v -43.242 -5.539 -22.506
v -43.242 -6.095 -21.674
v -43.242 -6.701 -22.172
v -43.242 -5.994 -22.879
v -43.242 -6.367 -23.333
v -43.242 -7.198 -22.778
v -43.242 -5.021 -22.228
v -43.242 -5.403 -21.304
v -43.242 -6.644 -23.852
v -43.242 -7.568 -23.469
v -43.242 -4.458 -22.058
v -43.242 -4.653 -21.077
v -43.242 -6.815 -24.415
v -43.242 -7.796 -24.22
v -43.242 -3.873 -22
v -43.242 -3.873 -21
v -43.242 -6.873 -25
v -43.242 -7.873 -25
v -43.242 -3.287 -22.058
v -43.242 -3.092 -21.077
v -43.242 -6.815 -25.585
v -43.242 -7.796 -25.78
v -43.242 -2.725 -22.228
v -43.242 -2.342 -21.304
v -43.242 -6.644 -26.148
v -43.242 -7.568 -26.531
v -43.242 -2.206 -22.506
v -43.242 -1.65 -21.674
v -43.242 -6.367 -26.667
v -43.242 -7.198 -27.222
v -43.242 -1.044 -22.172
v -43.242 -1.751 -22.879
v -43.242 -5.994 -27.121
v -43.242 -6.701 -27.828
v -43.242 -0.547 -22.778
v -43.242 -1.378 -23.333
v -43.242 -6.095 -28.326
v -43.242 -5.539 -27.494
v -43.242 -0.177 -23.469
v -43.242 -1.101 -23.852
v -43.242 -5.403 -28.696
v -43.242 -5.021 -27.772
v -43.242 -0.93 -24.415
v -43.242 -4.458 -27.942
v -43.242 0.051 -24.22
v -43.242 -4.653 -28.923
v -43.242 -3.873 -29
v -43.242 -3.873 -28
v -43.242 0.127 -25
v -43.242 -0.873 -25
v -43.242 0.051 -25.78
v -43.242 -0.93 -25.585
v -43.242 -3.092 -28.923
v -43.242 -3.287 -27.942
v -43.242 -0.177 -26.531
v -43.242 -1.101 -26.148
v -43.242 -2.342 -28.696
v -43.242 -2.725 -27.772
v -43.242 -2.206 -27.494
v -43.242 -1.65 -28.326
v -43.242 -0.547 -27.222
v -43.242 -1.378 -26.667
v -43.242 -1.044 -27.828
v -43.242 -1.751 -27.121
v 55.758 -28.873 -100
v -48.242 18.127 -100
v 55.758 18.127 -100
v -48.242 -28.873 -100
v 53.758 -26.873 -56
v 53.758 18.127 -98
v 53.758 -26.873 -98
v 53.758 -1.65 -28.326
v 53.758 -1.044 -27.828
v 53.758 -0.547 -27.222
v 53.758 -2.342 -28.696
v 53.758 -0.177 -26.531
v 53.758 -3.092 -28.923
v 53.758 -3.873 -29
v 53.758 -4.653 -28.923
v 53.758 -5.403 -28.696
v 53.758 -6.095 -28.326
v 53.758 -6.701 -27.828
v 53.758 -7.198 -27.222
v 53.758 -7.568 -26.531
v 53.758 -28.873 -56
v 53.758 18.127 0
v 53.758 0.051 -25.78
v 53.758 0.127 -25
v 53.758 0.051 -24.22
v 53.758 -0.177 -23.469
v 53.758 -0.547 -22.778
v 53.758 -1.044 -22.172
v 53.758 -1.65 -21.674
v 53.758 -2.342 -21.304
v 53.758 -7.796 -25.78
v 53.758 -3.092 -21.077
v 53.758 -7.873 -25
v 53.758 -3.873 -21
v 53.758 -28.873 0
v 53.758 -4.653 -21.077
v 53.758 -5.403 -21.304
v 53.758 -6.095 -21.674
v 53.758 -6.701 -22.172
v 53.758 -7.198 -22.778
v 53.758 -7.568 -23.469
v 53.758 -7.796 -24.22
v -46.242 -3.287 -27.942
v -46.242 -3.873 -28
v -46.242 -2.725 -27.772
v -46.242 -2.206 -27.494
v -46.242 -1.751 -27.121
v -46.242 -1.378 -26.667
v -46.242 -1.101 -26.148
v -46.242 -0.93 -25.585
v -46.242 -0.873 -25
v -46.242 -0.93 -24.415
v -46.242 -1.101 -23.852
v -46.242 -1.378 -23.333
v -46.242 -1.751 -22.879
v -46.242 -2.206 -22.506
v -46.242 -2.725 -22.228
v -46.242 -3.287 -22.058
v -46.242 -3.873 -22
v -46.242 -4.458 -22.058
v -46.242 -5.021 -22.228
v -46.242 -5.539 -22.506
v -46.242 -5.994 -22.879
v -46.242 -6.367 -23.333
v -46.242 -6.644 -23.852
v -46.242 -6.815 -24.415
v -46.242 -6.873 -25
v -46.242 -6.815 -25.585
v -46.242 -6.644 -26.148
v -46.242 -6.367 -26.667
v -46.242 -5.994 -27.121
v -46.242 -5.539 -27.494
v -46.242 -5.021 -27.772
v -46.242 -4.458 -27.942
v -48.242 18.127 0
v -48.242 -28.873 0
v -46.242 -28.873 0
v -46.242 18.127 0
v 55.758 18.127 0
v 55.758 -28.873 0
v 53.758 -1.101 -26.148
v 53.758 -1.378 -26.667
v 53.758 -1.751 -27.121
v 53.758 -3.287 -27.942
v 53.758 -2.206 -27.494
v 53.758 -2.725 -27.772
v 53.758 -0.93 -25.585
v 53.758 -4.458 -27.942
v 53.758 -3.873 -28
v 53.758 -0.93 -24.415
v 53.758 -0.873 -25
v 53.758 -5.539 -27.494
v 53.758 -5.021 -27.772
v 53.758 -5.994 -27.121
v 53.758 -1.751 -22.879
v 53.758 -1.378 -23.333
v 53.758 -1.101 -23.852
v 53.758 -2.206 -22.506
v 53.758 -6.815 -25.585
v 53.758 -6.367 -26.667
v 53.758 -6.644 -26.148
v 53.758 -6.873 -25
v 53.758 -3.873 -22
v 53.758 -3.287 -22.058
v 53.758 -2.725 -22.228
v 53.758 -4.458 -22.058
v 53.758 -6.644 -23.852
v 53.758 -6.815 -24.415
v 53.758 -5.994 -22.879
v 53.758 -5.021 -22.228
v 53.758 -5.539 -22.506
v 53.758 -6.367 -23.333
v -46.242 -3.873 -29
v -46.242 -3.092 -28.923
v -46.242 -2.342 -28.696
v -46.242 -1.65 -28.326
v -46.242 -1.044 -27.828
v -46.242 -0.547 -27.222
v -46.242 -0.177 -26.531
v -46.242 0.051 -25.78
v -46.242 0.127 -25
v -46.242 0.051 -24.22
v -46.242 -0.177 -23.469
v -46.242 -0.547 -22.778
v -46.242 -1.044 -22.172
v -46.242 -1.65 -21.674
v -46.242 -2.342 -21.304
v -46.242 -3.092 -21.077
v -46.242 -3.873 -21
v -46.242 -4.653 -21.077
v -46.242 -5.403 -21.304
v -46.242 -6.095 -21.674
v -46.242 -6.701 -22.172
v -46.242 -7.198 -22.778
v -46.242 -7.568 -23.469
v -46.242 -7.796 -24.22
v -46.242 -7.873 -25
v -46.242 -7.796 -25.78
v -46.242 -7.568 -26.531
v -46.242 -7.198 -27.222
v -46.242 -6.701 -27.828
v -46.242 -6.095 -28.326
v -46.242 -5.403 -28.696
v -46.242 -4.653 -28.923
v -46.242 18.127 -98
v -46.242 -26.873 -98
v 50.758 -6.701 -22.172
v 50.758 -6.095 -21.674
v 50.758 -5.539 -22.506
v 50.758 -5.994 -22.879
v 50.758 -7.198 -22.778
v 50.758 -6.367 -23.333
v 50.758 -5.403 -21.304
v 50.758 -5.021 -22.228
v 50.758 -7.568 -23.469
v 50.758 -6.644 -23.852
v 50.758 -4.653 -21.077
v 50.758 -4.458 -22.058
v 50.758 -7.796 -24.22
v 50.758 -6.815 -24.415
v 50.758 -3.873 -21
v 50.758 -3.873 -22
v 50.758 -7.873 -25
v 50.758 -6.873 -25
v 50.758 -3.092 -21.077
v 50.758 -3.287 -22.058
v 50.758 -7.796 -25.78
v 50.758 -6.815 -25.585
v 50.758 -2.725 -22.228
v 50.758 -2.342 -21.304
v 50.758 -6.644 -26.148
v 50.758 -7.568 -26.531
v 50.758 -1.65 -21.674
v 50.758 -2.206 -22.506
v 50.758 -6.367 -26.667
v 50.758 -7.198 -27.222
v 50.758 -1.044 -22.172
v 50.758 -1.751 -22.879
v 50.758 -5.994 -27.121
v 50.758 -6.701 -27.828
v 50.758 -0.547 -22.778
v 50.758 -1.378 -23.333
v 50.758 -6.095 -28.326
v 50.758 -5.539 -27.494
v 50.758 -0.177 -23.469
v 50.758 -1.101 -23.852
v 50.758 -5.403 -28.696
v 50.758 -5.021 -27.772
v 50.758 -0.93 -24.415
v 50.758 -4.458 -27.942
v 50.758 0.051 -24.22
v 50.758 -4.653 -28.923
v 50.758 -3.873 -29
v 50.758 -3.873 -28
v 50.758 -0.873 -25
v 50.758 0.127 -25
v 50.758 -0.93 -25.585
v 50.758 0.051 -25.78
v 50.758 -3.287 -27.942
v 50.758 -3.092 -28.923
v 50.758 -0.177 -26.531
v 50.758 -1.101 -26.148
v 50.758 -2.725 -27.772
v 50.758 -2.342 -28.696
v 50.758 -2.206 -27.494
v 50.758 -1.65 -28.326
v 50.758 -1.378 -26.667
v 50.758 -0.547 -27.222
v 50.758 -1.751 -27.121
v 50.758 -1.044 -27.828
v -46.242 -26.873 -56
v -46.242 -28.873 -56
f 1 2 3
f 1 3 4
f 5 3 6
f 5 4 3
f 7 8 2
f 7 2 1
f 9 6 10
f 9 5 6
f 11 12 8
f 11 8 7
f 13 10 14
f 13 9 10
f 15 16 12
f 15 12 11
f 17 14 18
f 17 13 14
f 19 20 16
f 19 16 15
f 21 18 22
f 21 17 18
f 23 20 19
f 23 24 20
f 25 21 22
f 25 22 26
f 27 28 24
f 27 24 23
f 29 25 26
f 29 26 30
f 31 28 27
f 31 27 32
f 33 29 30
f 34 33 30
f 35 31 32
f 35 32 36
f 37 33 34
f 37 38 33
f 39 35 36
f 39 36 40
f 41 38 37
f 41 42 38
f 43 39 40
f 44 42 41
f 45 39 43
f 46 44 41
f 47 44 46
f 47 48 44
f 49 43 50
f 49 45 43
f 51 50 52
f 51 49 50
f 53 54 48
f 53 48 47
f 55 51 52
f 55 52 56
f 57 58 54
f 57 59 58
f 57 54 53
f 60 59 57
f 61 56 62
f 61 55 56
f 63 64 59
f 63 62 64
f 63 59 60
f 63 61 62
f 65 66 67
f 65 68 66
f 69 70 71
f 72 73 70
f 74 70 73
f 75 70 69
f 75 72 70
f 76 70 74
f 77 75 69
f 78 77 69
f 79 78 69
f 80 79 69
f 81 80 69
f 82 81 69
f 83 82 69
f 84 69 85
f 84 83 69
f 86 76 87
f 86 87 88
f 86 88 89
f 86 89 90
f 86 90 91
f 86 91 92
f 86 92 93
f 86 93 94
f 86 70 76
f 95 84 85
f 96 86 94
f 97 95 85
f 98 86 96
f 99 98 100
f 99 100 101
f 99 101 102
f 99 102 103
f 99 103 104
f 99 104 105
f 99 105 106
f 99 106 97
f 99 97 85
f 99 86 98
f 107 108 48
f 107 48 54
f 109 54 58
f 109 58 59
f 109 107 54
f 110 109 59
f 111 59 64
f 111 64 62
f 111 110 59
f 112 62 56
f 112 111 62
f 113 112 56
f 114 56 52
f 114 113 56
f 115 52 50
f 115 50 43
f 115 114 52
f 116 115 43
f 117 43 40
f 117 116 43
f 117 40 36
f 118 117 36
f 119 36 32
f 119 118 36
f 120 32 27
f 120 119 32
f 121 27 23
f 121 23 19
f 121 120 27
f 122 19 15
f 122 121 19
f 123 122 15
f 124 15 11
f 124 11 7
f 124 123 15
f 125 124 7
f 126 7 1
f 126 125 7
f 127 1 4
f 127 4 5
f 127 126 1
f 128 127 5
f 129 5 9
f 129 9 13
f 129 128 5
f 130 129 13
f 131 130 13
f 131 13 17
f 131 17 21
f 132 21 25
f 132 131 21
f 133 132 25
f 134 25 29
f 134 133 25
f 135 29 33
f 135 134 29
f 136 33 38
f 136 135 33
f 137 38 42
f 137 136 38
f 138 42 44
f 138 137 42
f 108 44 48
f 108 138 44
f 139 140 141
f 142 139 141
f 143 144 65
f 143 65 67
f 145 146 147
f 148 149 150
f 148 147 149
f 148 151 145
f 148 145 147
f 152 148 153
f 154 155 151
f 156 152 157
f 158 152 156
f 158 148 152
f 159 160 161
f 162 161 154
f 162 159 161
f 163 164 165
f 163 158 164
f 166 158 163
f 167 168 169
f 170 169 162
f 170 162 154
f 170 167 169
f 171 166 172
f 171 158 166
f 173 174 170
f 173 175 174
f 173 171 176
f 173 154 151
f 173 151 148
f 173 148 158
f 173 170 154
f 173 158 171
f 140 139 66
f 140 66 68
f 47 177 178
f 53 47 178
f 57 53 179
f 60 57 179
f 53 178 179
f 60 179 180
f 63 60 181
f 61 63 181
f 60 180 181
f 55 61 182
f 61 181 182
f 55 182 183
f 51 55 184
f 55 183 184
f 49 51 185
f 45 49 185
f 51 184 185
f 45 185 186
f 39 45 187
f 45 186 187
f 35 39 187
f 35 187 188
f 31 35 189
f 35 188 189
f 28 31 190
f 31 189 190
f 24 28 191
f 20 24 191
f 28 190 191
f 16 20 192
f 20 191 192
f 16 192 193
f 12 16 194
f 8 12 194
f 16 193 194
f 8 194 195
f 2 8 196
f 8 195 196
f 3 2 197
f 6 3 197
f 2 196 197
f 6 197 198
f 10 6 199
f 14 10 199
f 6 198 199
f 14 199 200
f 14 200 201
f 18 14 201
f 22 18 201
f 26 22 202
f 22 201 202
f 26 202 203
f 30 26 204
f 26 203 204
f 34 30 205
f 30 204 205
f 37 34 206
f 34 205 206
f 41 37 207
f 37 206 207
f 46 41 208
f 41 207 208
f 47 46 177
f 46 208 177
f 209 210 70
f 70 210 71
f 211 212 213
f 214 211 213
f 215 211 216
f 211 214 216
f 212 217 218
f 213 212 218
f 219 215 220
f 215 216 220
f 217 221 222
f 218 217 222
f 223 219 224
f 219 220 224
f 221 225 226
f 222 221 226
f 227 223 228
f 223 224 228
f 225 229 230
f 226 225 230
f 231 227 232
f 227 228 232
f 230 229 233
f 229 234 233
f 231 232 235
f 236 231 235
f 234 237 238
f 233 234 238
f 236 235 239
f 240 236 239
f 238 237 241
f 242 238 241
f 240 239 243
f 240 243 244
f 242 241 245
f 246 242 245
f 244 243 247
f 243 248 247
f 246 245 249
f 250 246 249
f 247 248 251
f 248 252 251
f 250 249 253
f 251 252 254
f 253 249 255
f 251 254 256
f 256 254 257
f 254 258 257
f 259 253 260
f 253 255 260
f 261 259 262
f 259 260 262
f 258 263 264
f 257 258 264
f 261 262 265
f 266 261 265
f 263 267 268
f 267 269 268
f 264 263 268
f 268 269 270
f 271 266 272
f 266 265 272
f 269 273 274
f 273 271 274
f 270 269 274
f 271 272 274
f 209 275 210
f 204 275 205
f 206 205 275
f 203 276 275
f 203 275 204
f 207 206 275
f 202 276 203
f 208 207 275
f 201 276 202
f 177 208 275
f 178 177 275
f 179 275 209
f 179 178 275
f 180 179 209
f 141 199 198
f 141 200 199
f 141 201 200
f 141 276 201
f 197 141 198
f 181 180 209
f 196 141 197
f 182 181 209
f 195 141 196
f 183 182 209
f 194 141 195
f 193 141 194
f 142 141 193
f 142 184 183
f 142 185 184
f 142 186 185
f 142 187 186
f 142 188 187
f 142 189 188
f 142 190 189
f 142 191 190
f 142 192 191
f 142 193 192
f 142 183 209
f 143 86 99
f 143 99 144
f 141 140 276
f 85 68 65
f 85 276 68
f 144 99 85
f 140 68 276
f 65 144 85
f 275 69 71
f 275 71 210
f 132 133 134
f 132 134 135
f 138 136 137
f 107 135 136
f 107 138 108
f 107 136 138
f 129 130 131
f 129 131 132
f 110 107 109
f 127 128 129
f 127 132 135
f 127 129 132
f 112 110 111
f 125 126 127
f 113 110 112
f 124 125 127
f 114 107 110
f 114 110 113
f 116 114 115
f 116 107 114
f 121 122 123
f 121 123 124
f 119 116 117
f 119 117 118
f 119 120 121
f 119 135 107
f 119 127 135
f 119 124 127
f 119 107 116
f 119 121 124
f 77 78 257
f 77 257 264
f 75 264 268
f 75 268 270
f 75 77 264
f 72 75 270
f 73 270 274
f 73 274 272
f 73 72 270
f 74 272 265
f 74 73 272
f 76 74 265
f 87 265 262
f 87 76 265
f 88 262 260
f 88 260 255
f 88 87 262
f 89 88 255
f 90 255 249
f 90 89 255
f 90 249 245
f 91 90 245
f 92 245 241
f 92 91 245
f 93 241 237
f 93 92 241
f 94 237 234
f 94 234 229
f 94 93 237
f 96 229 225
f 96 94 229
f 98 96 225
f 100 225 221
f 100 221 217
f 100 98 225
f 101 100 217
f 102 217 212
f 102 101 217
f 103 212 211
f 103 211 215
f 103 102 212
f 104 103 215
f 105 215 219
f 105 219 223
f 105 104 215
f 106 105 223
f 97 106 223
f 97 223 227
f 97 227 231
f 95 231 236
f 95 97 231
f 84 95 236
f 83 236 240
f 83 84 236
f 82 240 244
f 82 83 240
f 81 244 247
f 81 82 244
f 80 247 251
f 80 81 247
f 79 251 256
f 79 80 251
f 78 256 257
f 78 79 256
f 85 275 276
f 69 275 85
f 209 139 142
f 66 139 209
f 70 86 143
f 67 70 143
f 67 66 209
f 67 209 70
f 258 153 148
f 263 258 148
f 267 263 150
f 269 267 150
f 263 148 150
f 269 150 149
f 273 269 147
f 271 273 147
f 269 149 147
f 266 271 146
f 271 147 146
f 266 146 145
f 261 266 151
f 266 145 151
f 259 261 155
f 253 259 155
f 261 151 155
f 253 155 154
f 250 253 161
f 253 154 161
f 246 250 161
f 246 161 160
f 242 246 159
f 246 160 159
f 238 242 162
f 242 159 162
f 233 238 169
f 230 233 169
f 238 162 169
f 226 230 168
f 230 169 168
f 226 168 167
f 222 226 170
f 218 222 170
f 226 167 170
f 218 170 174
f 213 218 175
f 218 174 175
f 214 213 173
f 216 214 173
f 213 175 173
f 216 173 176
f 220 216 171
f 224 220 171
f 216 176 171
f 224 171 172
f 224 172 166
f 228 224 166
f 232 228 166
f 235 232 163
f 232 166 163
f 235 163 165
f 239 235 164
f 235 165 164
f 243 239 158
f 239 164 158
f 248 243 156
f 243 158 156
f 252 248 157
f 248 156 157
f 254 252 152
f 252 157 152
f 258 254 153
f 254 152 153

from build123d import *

# Parameters (mm, degrees)
EXTRUDE_1_DEPTH     = 100
SKETCH_5_W          = 100
SKETCH_5_H          = 2
EXTRUDE_1_2_DEPTH   = 45
SKETCH_6_W          = 100
SKETCH_6_H          = 56
CUT_EXTRUDE_1_DEPTH = 124.020020532
SKETCH_7_R          = 4
SKETCH_7_R_2        = 3
EXTRUDE_2_DEPTH     = 3


with BuildPart() as part:
    # 草图1 → Extrude 1 (new body)
    with BuildSketch(Plane.XY):
        Polygon((-48.242261061, 18.127395065), (-48.242261061, -28.872604935), (55.757738939, -28.872604935), (55.757738939, 18.127395065), (53.757738939, 18.127395065), (53.757738939, -26.872604935), (-46.242261061, -26.872604935), (-46.242261061, 18.127395065), align=None)
    extrude(amount=-EXTRUDE_1_DEPTH)

    # 草图5 → Extrude 1 2 (add)
    with BuildSketch(Plane(origin=(0, -26.872604935, 0), x_dir=(1, 0, 0), z_dir=(0, 1, 0))):
        with Locations((3.757738939, 99)):
            Rectangle(SKETCH_5_W, SKETCH_5_H)
    extrude(amount=EXTRUDE_1_2_DEPTH)

    # 草图6 → 切除-拉伸1 (cut, through all)
    with BuildSketch(Plane(origin=(0, -26.872604935, 0), x_dir=(1, 0, 0), z_dir=(0, 1, 0))):
        with Locations((3.757738939, 28)):
            Rectangle(SKETCH_6_W, SKETCH_6_H)
    extrude(amount=-CUT_EXTRUDE_1_DEPTH, mode=Mode.SUBTRACT)

    # 草图7 → 拉伸-薄壁2 (add)
    with BuildSketch(Plane(origin=(-46.242261061, 0, 0), x_dir=(0, 0, -1), z_dir=(1, 0, 0))):
        with Locations((25, -3.872604935)):
            Circle(SKETCH_7_R)
        with Locations((25, -3.872604935)):
            Circle(SKETCH_7_R_2, mode=Mode.SUBTRACT)
    extrude_2 = extrude(amount=EXTRUDE_2_DEPTH)

    # 镜向1: 拉伸-薄壁2 across plane
    add(extrude_2.mirror(Plane(origin=(3.757738939, 0, 0), x_dir=(0, 0, 1), z_dir=(1, 0, 0))))


solid = part.part
